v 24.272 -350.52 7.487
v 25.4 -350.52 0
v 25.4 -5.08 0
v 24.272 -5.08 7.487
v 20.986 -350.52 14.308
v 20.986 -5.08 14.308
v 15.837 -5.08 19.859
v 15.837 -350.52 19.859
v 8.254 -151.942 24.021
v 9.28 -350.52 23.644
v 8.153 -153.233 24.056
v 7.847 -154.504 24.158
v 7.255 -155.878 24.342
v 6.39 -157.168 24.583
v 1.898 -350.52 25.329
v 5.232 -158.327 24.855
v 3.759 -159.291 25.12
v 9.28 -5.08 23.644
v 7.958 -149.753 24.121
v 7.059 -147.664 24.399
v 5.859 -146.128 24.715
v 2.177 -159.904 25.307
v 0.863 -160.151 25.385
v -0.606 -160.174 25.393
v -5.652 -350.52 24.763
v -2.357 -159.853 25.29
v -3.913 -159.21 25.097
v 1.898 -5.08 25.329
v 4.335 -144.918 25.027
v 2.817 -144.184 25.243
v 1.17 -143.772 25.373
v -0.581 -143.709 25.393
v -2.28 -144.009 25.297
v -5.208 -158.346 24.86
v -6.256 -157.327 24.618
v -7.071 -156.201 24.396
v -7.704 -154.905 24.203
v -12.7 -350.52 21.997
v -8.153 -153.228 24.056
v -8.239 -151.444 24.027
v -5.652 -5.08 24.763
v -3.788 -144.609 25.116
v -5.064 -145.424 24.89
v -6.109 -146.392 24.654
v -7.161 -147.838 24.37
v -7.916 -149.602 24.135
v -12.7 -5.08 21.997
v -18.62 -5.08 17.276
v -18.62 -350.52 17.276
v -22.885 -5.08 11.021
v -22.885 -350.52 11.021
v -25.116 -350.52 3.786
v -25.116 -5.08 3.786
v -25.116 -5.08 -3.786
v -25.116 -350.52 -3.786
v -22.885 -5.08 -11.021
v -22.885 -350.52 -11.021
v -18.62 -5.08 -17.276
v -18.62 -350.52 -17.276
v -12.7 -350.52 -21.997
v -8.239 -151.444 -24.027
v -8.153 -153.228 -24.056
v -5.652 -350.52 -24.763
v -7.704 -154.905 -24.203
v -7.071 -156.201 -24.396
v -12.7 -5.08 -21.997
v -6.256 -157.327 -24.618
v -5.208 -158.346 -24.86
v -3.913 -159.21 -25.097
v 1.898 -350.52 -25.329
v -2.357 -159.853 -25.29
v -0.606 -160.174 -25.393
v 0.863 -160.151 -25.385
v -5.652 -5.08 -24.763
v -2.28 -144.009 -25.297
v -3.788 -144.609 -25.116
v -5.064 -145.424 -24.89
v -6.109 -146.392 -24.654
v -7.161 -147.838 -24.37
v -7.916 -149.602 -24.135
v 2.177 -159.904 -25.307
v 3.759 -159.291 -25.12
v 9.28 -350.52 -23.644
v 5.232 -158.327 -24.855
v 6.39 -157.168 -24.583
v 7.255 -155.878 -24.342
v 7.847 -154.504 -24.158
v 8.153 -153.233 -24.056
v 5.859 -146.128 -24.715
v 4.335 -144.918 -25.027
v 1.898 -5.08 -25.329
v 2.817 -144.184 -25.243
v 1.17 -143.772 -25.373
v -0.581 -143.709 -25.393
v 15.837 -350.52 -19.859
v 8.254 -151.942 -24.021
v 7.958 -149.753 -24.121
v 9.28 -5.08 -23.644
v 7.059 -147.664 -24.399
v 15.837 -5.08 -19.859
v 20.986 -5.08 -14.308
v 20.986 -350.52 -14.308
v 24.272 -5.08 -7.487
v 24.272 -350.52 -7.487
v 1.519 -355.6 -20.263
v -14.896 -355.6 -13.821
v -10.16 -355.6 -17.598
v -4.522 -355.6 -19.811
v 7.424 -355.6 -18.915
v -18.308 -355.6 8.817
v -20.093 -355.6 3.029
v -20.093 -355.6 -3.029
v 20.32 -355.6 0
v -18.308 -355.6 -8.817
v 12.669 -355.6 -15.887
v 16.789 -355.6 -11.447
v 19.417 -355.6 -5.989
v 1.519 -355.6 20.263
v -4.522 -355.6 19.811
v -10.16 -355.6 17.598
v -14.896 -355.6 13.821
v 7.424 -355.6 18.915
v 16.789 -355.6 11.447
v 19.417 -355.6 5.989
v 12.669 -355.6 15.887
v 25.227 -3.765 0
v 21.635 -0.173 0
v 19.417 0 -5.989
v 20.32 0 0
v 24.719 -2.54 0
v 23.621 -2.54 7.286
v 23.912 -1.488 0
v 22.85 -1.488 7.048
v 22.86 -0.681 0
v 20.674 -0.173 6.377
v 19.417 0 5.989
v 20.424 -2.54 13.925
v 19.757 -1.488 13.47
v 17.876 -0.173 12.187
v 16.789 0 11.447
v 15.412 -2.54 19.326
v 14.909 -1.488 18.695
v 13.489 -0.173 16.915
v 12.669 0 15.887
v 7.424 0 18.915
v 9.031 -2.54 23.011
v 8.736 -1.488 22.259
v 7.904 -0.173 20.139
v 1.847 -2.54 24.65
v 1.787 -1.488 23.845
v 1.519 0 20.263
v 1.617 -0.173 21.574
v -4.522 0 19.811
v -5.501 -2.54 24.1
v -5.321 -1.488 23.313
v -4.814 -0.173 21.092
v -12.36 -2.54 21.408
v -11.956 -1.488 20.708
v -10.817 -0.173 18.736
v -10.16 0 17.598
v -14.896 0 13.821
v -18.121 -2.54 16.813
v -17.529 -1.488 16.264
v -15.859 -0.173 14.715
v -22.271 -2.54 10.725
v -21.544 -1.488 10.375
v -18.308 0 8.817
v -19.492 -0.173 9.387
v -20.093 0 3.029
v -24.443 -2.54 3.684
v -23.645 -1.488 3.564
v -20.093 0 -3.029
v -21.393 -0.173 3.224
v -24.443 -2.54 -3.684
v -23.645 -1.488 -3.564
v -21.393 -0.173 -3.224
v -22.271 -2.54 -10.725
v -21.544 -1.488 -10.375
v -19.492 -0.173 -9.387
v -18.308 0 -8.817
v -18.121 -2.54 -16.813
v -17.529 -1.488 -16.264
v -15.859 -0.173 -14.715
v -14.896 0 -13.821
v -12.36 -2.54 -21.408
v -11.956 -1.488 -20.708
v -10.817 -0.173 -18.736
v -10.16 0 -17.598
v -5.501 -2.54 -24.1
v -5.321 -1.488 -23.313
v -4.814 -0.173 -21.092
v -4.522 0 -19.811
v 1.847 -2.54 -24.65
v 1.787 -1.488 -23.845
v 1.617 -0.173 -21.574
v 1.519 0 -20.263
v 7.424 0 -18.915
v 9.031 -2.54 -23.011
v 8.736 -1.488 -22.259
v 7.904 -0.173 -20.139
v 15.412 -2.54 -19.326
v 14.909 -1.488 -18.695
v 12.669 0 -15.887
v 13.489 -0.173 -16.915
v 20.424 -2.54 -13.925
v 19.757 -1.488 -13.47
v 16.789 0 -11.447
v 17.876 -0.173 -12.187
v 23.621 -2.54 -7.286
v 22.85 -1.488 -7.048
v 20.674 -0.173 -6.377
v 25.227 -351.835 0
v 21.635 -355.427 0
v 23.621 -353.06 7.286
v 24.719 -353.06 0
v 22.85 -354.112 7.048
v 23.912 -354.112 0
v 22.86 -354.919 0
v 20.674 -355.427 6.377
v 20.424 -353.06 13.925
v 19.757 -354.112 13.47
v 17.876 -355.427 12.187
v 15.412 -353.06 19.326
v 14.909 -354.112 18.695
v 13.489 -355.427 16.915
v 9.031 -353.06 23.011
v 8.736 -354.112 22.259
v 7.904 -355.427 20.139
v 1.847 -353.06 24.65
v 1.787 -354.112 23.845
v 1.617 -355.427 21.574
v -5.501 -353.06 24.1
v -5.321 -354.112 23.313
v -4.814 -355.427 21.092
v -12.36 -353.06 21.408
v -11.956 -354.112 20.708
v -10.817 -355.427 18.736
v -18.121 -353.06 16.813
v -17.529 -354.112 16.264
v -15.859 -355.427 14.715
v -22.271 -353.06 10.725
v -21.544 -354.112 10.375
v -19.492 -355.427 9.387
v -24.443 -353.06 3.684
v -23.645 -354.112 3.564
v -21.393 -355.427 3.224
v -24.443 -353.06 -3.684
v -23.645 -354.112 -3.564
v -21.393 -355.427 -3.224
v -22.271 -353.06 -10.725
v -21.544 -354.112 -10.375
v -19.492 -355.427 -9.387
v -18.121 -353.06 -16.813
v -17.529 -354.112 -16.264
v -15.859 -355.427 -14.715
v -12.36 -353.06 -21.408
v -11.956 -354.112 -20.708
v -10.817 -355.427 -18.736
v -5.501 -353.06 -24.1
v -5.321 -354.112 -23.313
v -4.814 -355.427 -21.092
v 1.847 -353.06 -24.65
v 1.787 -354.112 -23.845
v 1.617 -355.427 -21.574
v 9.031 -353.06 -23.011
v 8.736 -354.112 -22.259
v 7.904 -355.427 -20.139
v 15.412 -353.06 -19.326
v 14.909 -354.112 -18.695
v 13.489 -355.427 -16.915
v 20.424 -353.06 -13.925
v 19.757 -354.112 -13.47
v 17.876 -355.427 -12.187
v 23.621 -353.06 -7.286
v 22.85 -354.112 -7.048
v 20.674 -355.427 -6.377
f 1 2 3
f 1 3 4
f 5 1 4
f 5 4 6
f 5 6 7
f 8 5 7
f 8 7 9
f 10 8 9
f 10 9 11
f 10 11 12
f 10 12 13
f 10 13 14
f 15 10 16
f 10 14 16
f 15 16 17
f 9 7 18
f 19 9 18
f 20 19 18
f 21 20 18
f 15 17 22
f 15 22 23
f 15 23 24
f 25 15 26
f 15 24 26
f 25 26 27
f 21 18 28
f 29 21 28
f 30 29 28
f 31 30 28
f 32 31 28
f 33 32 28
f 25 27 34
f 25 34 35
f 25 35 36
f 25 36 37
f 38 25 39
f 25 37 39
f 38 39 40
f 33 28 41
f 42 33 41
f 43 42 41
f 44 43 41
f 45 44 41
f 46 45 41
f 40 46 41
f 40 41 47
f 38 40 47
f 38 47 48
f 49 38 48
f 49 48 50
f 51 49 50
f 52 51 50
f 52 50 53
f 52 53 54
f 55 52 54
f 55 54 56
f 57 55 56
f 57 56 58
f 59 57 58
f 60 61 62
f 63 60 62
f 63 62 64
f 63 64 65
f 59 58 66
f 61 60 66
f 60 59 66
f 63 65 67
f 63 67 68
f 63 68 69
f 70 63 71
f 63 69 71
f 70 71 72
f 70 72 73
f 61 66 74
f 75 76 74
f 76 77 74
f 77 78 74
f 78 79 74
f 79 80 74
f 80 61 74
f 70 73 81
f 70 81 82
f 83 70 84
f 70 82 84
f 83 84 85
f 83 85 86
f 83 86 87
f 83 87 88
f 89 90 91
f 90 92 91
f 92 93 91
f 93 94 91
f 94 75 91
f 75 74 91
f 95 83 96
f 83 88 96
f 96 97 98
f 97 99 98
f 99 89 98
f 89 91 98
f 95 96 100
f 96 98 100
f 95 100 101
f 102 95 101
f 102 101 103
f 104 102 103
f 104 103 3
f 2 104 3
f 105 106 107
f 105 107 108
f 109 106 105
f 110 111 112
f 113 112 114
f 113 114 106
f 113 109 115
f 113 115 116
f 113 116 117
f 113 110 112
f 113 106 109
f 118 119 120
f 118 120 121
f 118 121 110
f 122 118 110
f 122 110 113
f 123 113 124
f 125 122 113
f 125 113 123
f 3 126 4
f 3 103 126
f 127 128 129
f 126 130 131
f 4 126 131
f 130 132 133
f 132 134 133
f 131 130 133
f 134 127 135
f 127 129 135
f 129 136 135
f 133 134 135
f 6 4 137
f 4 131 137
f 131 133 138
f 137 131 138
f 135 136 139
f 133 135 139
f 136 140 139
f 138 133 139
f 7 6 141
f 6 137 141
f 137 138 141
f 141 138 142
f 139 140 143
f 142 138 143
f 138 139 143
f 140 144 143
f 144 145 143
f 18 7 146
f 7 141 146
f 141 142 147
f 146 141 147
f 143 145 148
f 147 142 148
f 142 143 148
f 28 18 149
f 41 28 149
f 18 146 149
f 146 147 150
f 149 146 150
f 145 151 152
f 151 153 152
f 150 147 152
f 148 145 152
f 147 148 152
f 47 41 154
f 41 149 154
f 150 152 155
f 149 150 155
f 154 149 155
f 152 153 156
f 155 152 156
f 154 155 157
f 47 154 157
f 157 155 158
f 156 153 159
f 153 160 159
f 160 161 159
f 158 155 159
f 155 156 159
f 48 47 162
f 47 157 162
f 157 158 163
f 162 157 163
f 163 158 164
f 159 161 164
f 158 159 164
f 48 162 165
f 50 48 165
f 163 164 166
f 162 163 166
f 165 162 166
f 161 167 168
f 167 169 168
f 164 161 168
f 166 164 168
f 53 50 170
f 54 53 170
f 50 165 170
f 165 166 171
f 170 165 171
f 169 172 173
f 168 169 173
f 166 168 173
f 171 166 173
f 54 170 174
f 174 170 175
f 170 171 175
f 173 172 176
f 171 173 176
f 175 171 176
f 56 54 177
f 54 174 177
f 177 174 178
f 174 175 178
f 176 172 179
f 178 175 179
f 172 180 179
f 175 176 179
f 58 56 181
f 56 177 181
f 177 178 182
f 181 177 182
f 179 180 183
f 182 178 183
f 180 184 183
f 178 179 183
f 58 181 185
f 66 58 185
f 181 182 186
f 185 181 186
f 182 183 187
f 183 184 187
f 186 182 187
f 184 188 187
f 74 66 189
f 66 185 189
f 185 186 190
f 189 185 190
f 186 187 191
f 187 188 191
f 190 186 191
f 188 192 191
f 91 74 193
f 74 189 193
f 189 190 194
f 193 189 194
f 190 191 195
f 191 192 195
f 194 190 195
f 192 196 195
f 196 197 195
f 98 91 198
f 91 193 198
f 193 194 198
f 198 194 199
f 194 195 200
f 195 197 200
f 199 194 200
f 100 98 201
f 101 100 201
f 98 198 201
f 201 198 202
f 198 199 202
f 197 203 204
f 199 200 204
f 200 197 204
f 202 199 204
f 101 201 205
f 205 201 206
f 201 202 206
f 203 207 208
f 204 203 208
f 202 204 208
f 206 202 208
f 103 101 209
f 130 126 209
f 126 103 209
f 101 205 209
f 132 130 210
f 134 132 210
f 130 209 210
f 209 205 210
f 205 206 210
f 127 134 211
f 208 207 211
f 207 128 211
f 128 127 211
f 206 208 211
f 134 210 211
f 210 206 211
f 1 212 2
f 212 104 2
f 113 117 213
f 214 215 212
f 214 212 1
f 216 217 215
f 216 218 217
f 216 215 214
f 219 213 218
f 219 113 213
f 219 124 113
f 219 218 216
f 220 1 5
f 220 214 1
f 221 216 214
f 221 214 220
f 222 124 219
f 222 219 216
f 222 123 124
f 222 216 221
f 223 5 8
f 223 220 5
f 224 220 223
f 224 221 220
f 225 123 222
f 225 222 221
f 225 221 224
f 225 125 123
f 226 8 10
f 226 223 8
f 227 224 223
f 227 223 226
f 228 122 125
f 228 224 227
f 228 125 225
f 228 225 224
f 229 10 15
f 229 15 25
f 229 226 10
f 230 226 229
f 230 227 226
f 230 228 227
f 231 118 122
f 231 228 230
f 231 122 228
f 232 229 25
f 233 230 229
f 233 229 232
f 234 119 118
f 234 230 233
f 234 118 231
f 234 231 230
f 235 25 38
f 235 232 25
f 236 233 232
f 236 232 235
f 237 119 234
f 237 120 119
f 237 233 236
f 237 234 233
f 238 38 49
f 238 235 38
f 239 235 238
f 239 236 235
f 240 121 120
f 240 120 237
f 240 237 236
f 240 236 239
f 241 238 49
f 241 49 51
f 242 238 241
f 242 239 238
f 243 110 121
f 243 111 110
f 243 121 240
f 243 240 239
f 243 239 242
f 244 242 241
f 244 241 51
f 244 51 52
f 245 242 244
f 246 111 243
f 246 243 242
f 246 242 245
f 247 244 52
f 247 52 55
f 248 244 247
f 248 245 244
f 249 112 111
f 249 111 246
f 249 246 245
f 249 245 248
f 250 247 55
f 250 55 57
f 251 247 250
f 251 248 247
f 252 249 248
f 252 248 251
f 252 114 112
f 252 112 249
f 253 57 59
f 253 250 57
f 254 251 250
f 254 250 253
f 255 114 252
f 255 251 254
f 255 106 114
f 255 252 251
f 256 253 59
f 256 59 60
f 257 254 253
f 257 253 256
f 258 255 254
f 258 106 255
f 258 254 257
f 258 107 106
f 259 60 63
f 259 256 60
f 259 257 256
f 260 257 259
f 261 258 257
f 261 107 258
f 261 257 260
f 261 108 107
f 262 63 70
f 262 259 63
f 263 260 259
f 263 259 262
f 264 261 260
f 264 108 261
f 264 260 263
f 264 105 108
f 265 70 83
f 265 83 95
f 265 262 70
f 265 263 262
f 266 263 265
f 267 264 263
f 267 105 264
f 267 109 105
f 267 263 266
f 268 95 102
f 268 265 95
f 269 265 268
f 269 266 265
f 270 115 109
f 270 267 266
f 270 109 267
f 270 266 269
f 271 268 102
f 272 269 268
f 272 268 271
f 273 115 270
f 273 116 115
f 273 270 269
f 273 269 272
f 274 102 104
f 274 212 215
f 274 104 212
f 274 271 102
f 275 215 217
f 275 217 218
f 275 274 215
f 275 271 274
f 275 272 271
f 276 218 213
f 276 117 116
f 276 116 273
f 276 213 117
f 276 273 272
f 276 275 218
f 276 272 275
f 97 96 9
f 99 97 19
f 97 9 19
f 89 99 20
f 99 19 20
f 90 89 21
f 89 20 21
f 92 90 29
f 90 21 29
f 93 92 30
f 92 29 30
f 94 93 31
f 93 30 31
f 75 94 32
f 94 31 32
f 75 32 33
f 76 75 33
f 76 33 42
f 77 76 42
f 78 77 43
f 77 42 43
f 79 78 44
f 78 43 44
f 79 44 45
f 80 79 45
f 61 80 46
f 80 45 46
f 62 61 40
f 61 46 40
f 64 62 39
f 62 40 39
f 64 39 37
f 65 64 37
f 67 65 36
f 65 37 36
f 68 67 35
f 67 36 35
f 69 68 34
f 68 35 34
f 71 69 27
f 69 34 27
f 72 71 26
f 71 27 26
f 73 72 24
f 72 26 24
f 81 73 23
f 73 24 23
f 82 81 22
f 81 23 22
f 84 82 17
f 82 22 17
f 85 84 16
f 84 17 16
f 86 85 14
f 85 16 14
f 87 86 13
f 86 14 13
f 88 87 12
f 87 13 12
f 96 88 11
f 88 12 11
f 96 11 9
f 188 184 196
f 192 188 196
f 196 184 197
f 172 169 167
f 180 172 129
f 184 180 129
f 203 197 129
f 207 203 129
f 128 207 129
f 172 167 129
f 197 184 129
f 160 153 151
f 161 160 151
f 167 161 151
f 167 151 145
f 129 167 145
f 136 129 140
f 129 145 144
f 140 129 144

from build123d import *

# Parameters (mm, degrees)
F0_R     = 25.4
F1_DEPTH = 355.6
F2_R     = 5.08
F3_R     = 5.08
F4_R     = 8.254169
F5_DEPTH = 88.9


with BuildPart() as f1:
    # F0 (on Front) → F1 (new body)
    with BuildSketch(Plane.XZ):
        Circle(F0_R)
    extrude(amount=F1_DEPTH)

    # F2
    f2_edges = [f1.edges().sort_by_distance(p)[0] for p in [
        (-25.4, -355.6, 0),
    ]]
    fillet(f2_edges, radius=F2_R)

    # F3
    f3_edges = [f1.edges().sort_by_distance(p)[0] for p in [
        (-25.4, 0, 0),
    ]]
    fillet(f3_edges, radius=F3_R)

    # F4 (on Top) → F5 (cut, symmetric)
    with BuildSketch(Plane.XY):
        with Locations((0, -151.942372)):
            Circle(F4_R)
    extrude(amount=F5_DEPTH, both=True, mode=Mode.SUBTRACT)


solid = f1.part
